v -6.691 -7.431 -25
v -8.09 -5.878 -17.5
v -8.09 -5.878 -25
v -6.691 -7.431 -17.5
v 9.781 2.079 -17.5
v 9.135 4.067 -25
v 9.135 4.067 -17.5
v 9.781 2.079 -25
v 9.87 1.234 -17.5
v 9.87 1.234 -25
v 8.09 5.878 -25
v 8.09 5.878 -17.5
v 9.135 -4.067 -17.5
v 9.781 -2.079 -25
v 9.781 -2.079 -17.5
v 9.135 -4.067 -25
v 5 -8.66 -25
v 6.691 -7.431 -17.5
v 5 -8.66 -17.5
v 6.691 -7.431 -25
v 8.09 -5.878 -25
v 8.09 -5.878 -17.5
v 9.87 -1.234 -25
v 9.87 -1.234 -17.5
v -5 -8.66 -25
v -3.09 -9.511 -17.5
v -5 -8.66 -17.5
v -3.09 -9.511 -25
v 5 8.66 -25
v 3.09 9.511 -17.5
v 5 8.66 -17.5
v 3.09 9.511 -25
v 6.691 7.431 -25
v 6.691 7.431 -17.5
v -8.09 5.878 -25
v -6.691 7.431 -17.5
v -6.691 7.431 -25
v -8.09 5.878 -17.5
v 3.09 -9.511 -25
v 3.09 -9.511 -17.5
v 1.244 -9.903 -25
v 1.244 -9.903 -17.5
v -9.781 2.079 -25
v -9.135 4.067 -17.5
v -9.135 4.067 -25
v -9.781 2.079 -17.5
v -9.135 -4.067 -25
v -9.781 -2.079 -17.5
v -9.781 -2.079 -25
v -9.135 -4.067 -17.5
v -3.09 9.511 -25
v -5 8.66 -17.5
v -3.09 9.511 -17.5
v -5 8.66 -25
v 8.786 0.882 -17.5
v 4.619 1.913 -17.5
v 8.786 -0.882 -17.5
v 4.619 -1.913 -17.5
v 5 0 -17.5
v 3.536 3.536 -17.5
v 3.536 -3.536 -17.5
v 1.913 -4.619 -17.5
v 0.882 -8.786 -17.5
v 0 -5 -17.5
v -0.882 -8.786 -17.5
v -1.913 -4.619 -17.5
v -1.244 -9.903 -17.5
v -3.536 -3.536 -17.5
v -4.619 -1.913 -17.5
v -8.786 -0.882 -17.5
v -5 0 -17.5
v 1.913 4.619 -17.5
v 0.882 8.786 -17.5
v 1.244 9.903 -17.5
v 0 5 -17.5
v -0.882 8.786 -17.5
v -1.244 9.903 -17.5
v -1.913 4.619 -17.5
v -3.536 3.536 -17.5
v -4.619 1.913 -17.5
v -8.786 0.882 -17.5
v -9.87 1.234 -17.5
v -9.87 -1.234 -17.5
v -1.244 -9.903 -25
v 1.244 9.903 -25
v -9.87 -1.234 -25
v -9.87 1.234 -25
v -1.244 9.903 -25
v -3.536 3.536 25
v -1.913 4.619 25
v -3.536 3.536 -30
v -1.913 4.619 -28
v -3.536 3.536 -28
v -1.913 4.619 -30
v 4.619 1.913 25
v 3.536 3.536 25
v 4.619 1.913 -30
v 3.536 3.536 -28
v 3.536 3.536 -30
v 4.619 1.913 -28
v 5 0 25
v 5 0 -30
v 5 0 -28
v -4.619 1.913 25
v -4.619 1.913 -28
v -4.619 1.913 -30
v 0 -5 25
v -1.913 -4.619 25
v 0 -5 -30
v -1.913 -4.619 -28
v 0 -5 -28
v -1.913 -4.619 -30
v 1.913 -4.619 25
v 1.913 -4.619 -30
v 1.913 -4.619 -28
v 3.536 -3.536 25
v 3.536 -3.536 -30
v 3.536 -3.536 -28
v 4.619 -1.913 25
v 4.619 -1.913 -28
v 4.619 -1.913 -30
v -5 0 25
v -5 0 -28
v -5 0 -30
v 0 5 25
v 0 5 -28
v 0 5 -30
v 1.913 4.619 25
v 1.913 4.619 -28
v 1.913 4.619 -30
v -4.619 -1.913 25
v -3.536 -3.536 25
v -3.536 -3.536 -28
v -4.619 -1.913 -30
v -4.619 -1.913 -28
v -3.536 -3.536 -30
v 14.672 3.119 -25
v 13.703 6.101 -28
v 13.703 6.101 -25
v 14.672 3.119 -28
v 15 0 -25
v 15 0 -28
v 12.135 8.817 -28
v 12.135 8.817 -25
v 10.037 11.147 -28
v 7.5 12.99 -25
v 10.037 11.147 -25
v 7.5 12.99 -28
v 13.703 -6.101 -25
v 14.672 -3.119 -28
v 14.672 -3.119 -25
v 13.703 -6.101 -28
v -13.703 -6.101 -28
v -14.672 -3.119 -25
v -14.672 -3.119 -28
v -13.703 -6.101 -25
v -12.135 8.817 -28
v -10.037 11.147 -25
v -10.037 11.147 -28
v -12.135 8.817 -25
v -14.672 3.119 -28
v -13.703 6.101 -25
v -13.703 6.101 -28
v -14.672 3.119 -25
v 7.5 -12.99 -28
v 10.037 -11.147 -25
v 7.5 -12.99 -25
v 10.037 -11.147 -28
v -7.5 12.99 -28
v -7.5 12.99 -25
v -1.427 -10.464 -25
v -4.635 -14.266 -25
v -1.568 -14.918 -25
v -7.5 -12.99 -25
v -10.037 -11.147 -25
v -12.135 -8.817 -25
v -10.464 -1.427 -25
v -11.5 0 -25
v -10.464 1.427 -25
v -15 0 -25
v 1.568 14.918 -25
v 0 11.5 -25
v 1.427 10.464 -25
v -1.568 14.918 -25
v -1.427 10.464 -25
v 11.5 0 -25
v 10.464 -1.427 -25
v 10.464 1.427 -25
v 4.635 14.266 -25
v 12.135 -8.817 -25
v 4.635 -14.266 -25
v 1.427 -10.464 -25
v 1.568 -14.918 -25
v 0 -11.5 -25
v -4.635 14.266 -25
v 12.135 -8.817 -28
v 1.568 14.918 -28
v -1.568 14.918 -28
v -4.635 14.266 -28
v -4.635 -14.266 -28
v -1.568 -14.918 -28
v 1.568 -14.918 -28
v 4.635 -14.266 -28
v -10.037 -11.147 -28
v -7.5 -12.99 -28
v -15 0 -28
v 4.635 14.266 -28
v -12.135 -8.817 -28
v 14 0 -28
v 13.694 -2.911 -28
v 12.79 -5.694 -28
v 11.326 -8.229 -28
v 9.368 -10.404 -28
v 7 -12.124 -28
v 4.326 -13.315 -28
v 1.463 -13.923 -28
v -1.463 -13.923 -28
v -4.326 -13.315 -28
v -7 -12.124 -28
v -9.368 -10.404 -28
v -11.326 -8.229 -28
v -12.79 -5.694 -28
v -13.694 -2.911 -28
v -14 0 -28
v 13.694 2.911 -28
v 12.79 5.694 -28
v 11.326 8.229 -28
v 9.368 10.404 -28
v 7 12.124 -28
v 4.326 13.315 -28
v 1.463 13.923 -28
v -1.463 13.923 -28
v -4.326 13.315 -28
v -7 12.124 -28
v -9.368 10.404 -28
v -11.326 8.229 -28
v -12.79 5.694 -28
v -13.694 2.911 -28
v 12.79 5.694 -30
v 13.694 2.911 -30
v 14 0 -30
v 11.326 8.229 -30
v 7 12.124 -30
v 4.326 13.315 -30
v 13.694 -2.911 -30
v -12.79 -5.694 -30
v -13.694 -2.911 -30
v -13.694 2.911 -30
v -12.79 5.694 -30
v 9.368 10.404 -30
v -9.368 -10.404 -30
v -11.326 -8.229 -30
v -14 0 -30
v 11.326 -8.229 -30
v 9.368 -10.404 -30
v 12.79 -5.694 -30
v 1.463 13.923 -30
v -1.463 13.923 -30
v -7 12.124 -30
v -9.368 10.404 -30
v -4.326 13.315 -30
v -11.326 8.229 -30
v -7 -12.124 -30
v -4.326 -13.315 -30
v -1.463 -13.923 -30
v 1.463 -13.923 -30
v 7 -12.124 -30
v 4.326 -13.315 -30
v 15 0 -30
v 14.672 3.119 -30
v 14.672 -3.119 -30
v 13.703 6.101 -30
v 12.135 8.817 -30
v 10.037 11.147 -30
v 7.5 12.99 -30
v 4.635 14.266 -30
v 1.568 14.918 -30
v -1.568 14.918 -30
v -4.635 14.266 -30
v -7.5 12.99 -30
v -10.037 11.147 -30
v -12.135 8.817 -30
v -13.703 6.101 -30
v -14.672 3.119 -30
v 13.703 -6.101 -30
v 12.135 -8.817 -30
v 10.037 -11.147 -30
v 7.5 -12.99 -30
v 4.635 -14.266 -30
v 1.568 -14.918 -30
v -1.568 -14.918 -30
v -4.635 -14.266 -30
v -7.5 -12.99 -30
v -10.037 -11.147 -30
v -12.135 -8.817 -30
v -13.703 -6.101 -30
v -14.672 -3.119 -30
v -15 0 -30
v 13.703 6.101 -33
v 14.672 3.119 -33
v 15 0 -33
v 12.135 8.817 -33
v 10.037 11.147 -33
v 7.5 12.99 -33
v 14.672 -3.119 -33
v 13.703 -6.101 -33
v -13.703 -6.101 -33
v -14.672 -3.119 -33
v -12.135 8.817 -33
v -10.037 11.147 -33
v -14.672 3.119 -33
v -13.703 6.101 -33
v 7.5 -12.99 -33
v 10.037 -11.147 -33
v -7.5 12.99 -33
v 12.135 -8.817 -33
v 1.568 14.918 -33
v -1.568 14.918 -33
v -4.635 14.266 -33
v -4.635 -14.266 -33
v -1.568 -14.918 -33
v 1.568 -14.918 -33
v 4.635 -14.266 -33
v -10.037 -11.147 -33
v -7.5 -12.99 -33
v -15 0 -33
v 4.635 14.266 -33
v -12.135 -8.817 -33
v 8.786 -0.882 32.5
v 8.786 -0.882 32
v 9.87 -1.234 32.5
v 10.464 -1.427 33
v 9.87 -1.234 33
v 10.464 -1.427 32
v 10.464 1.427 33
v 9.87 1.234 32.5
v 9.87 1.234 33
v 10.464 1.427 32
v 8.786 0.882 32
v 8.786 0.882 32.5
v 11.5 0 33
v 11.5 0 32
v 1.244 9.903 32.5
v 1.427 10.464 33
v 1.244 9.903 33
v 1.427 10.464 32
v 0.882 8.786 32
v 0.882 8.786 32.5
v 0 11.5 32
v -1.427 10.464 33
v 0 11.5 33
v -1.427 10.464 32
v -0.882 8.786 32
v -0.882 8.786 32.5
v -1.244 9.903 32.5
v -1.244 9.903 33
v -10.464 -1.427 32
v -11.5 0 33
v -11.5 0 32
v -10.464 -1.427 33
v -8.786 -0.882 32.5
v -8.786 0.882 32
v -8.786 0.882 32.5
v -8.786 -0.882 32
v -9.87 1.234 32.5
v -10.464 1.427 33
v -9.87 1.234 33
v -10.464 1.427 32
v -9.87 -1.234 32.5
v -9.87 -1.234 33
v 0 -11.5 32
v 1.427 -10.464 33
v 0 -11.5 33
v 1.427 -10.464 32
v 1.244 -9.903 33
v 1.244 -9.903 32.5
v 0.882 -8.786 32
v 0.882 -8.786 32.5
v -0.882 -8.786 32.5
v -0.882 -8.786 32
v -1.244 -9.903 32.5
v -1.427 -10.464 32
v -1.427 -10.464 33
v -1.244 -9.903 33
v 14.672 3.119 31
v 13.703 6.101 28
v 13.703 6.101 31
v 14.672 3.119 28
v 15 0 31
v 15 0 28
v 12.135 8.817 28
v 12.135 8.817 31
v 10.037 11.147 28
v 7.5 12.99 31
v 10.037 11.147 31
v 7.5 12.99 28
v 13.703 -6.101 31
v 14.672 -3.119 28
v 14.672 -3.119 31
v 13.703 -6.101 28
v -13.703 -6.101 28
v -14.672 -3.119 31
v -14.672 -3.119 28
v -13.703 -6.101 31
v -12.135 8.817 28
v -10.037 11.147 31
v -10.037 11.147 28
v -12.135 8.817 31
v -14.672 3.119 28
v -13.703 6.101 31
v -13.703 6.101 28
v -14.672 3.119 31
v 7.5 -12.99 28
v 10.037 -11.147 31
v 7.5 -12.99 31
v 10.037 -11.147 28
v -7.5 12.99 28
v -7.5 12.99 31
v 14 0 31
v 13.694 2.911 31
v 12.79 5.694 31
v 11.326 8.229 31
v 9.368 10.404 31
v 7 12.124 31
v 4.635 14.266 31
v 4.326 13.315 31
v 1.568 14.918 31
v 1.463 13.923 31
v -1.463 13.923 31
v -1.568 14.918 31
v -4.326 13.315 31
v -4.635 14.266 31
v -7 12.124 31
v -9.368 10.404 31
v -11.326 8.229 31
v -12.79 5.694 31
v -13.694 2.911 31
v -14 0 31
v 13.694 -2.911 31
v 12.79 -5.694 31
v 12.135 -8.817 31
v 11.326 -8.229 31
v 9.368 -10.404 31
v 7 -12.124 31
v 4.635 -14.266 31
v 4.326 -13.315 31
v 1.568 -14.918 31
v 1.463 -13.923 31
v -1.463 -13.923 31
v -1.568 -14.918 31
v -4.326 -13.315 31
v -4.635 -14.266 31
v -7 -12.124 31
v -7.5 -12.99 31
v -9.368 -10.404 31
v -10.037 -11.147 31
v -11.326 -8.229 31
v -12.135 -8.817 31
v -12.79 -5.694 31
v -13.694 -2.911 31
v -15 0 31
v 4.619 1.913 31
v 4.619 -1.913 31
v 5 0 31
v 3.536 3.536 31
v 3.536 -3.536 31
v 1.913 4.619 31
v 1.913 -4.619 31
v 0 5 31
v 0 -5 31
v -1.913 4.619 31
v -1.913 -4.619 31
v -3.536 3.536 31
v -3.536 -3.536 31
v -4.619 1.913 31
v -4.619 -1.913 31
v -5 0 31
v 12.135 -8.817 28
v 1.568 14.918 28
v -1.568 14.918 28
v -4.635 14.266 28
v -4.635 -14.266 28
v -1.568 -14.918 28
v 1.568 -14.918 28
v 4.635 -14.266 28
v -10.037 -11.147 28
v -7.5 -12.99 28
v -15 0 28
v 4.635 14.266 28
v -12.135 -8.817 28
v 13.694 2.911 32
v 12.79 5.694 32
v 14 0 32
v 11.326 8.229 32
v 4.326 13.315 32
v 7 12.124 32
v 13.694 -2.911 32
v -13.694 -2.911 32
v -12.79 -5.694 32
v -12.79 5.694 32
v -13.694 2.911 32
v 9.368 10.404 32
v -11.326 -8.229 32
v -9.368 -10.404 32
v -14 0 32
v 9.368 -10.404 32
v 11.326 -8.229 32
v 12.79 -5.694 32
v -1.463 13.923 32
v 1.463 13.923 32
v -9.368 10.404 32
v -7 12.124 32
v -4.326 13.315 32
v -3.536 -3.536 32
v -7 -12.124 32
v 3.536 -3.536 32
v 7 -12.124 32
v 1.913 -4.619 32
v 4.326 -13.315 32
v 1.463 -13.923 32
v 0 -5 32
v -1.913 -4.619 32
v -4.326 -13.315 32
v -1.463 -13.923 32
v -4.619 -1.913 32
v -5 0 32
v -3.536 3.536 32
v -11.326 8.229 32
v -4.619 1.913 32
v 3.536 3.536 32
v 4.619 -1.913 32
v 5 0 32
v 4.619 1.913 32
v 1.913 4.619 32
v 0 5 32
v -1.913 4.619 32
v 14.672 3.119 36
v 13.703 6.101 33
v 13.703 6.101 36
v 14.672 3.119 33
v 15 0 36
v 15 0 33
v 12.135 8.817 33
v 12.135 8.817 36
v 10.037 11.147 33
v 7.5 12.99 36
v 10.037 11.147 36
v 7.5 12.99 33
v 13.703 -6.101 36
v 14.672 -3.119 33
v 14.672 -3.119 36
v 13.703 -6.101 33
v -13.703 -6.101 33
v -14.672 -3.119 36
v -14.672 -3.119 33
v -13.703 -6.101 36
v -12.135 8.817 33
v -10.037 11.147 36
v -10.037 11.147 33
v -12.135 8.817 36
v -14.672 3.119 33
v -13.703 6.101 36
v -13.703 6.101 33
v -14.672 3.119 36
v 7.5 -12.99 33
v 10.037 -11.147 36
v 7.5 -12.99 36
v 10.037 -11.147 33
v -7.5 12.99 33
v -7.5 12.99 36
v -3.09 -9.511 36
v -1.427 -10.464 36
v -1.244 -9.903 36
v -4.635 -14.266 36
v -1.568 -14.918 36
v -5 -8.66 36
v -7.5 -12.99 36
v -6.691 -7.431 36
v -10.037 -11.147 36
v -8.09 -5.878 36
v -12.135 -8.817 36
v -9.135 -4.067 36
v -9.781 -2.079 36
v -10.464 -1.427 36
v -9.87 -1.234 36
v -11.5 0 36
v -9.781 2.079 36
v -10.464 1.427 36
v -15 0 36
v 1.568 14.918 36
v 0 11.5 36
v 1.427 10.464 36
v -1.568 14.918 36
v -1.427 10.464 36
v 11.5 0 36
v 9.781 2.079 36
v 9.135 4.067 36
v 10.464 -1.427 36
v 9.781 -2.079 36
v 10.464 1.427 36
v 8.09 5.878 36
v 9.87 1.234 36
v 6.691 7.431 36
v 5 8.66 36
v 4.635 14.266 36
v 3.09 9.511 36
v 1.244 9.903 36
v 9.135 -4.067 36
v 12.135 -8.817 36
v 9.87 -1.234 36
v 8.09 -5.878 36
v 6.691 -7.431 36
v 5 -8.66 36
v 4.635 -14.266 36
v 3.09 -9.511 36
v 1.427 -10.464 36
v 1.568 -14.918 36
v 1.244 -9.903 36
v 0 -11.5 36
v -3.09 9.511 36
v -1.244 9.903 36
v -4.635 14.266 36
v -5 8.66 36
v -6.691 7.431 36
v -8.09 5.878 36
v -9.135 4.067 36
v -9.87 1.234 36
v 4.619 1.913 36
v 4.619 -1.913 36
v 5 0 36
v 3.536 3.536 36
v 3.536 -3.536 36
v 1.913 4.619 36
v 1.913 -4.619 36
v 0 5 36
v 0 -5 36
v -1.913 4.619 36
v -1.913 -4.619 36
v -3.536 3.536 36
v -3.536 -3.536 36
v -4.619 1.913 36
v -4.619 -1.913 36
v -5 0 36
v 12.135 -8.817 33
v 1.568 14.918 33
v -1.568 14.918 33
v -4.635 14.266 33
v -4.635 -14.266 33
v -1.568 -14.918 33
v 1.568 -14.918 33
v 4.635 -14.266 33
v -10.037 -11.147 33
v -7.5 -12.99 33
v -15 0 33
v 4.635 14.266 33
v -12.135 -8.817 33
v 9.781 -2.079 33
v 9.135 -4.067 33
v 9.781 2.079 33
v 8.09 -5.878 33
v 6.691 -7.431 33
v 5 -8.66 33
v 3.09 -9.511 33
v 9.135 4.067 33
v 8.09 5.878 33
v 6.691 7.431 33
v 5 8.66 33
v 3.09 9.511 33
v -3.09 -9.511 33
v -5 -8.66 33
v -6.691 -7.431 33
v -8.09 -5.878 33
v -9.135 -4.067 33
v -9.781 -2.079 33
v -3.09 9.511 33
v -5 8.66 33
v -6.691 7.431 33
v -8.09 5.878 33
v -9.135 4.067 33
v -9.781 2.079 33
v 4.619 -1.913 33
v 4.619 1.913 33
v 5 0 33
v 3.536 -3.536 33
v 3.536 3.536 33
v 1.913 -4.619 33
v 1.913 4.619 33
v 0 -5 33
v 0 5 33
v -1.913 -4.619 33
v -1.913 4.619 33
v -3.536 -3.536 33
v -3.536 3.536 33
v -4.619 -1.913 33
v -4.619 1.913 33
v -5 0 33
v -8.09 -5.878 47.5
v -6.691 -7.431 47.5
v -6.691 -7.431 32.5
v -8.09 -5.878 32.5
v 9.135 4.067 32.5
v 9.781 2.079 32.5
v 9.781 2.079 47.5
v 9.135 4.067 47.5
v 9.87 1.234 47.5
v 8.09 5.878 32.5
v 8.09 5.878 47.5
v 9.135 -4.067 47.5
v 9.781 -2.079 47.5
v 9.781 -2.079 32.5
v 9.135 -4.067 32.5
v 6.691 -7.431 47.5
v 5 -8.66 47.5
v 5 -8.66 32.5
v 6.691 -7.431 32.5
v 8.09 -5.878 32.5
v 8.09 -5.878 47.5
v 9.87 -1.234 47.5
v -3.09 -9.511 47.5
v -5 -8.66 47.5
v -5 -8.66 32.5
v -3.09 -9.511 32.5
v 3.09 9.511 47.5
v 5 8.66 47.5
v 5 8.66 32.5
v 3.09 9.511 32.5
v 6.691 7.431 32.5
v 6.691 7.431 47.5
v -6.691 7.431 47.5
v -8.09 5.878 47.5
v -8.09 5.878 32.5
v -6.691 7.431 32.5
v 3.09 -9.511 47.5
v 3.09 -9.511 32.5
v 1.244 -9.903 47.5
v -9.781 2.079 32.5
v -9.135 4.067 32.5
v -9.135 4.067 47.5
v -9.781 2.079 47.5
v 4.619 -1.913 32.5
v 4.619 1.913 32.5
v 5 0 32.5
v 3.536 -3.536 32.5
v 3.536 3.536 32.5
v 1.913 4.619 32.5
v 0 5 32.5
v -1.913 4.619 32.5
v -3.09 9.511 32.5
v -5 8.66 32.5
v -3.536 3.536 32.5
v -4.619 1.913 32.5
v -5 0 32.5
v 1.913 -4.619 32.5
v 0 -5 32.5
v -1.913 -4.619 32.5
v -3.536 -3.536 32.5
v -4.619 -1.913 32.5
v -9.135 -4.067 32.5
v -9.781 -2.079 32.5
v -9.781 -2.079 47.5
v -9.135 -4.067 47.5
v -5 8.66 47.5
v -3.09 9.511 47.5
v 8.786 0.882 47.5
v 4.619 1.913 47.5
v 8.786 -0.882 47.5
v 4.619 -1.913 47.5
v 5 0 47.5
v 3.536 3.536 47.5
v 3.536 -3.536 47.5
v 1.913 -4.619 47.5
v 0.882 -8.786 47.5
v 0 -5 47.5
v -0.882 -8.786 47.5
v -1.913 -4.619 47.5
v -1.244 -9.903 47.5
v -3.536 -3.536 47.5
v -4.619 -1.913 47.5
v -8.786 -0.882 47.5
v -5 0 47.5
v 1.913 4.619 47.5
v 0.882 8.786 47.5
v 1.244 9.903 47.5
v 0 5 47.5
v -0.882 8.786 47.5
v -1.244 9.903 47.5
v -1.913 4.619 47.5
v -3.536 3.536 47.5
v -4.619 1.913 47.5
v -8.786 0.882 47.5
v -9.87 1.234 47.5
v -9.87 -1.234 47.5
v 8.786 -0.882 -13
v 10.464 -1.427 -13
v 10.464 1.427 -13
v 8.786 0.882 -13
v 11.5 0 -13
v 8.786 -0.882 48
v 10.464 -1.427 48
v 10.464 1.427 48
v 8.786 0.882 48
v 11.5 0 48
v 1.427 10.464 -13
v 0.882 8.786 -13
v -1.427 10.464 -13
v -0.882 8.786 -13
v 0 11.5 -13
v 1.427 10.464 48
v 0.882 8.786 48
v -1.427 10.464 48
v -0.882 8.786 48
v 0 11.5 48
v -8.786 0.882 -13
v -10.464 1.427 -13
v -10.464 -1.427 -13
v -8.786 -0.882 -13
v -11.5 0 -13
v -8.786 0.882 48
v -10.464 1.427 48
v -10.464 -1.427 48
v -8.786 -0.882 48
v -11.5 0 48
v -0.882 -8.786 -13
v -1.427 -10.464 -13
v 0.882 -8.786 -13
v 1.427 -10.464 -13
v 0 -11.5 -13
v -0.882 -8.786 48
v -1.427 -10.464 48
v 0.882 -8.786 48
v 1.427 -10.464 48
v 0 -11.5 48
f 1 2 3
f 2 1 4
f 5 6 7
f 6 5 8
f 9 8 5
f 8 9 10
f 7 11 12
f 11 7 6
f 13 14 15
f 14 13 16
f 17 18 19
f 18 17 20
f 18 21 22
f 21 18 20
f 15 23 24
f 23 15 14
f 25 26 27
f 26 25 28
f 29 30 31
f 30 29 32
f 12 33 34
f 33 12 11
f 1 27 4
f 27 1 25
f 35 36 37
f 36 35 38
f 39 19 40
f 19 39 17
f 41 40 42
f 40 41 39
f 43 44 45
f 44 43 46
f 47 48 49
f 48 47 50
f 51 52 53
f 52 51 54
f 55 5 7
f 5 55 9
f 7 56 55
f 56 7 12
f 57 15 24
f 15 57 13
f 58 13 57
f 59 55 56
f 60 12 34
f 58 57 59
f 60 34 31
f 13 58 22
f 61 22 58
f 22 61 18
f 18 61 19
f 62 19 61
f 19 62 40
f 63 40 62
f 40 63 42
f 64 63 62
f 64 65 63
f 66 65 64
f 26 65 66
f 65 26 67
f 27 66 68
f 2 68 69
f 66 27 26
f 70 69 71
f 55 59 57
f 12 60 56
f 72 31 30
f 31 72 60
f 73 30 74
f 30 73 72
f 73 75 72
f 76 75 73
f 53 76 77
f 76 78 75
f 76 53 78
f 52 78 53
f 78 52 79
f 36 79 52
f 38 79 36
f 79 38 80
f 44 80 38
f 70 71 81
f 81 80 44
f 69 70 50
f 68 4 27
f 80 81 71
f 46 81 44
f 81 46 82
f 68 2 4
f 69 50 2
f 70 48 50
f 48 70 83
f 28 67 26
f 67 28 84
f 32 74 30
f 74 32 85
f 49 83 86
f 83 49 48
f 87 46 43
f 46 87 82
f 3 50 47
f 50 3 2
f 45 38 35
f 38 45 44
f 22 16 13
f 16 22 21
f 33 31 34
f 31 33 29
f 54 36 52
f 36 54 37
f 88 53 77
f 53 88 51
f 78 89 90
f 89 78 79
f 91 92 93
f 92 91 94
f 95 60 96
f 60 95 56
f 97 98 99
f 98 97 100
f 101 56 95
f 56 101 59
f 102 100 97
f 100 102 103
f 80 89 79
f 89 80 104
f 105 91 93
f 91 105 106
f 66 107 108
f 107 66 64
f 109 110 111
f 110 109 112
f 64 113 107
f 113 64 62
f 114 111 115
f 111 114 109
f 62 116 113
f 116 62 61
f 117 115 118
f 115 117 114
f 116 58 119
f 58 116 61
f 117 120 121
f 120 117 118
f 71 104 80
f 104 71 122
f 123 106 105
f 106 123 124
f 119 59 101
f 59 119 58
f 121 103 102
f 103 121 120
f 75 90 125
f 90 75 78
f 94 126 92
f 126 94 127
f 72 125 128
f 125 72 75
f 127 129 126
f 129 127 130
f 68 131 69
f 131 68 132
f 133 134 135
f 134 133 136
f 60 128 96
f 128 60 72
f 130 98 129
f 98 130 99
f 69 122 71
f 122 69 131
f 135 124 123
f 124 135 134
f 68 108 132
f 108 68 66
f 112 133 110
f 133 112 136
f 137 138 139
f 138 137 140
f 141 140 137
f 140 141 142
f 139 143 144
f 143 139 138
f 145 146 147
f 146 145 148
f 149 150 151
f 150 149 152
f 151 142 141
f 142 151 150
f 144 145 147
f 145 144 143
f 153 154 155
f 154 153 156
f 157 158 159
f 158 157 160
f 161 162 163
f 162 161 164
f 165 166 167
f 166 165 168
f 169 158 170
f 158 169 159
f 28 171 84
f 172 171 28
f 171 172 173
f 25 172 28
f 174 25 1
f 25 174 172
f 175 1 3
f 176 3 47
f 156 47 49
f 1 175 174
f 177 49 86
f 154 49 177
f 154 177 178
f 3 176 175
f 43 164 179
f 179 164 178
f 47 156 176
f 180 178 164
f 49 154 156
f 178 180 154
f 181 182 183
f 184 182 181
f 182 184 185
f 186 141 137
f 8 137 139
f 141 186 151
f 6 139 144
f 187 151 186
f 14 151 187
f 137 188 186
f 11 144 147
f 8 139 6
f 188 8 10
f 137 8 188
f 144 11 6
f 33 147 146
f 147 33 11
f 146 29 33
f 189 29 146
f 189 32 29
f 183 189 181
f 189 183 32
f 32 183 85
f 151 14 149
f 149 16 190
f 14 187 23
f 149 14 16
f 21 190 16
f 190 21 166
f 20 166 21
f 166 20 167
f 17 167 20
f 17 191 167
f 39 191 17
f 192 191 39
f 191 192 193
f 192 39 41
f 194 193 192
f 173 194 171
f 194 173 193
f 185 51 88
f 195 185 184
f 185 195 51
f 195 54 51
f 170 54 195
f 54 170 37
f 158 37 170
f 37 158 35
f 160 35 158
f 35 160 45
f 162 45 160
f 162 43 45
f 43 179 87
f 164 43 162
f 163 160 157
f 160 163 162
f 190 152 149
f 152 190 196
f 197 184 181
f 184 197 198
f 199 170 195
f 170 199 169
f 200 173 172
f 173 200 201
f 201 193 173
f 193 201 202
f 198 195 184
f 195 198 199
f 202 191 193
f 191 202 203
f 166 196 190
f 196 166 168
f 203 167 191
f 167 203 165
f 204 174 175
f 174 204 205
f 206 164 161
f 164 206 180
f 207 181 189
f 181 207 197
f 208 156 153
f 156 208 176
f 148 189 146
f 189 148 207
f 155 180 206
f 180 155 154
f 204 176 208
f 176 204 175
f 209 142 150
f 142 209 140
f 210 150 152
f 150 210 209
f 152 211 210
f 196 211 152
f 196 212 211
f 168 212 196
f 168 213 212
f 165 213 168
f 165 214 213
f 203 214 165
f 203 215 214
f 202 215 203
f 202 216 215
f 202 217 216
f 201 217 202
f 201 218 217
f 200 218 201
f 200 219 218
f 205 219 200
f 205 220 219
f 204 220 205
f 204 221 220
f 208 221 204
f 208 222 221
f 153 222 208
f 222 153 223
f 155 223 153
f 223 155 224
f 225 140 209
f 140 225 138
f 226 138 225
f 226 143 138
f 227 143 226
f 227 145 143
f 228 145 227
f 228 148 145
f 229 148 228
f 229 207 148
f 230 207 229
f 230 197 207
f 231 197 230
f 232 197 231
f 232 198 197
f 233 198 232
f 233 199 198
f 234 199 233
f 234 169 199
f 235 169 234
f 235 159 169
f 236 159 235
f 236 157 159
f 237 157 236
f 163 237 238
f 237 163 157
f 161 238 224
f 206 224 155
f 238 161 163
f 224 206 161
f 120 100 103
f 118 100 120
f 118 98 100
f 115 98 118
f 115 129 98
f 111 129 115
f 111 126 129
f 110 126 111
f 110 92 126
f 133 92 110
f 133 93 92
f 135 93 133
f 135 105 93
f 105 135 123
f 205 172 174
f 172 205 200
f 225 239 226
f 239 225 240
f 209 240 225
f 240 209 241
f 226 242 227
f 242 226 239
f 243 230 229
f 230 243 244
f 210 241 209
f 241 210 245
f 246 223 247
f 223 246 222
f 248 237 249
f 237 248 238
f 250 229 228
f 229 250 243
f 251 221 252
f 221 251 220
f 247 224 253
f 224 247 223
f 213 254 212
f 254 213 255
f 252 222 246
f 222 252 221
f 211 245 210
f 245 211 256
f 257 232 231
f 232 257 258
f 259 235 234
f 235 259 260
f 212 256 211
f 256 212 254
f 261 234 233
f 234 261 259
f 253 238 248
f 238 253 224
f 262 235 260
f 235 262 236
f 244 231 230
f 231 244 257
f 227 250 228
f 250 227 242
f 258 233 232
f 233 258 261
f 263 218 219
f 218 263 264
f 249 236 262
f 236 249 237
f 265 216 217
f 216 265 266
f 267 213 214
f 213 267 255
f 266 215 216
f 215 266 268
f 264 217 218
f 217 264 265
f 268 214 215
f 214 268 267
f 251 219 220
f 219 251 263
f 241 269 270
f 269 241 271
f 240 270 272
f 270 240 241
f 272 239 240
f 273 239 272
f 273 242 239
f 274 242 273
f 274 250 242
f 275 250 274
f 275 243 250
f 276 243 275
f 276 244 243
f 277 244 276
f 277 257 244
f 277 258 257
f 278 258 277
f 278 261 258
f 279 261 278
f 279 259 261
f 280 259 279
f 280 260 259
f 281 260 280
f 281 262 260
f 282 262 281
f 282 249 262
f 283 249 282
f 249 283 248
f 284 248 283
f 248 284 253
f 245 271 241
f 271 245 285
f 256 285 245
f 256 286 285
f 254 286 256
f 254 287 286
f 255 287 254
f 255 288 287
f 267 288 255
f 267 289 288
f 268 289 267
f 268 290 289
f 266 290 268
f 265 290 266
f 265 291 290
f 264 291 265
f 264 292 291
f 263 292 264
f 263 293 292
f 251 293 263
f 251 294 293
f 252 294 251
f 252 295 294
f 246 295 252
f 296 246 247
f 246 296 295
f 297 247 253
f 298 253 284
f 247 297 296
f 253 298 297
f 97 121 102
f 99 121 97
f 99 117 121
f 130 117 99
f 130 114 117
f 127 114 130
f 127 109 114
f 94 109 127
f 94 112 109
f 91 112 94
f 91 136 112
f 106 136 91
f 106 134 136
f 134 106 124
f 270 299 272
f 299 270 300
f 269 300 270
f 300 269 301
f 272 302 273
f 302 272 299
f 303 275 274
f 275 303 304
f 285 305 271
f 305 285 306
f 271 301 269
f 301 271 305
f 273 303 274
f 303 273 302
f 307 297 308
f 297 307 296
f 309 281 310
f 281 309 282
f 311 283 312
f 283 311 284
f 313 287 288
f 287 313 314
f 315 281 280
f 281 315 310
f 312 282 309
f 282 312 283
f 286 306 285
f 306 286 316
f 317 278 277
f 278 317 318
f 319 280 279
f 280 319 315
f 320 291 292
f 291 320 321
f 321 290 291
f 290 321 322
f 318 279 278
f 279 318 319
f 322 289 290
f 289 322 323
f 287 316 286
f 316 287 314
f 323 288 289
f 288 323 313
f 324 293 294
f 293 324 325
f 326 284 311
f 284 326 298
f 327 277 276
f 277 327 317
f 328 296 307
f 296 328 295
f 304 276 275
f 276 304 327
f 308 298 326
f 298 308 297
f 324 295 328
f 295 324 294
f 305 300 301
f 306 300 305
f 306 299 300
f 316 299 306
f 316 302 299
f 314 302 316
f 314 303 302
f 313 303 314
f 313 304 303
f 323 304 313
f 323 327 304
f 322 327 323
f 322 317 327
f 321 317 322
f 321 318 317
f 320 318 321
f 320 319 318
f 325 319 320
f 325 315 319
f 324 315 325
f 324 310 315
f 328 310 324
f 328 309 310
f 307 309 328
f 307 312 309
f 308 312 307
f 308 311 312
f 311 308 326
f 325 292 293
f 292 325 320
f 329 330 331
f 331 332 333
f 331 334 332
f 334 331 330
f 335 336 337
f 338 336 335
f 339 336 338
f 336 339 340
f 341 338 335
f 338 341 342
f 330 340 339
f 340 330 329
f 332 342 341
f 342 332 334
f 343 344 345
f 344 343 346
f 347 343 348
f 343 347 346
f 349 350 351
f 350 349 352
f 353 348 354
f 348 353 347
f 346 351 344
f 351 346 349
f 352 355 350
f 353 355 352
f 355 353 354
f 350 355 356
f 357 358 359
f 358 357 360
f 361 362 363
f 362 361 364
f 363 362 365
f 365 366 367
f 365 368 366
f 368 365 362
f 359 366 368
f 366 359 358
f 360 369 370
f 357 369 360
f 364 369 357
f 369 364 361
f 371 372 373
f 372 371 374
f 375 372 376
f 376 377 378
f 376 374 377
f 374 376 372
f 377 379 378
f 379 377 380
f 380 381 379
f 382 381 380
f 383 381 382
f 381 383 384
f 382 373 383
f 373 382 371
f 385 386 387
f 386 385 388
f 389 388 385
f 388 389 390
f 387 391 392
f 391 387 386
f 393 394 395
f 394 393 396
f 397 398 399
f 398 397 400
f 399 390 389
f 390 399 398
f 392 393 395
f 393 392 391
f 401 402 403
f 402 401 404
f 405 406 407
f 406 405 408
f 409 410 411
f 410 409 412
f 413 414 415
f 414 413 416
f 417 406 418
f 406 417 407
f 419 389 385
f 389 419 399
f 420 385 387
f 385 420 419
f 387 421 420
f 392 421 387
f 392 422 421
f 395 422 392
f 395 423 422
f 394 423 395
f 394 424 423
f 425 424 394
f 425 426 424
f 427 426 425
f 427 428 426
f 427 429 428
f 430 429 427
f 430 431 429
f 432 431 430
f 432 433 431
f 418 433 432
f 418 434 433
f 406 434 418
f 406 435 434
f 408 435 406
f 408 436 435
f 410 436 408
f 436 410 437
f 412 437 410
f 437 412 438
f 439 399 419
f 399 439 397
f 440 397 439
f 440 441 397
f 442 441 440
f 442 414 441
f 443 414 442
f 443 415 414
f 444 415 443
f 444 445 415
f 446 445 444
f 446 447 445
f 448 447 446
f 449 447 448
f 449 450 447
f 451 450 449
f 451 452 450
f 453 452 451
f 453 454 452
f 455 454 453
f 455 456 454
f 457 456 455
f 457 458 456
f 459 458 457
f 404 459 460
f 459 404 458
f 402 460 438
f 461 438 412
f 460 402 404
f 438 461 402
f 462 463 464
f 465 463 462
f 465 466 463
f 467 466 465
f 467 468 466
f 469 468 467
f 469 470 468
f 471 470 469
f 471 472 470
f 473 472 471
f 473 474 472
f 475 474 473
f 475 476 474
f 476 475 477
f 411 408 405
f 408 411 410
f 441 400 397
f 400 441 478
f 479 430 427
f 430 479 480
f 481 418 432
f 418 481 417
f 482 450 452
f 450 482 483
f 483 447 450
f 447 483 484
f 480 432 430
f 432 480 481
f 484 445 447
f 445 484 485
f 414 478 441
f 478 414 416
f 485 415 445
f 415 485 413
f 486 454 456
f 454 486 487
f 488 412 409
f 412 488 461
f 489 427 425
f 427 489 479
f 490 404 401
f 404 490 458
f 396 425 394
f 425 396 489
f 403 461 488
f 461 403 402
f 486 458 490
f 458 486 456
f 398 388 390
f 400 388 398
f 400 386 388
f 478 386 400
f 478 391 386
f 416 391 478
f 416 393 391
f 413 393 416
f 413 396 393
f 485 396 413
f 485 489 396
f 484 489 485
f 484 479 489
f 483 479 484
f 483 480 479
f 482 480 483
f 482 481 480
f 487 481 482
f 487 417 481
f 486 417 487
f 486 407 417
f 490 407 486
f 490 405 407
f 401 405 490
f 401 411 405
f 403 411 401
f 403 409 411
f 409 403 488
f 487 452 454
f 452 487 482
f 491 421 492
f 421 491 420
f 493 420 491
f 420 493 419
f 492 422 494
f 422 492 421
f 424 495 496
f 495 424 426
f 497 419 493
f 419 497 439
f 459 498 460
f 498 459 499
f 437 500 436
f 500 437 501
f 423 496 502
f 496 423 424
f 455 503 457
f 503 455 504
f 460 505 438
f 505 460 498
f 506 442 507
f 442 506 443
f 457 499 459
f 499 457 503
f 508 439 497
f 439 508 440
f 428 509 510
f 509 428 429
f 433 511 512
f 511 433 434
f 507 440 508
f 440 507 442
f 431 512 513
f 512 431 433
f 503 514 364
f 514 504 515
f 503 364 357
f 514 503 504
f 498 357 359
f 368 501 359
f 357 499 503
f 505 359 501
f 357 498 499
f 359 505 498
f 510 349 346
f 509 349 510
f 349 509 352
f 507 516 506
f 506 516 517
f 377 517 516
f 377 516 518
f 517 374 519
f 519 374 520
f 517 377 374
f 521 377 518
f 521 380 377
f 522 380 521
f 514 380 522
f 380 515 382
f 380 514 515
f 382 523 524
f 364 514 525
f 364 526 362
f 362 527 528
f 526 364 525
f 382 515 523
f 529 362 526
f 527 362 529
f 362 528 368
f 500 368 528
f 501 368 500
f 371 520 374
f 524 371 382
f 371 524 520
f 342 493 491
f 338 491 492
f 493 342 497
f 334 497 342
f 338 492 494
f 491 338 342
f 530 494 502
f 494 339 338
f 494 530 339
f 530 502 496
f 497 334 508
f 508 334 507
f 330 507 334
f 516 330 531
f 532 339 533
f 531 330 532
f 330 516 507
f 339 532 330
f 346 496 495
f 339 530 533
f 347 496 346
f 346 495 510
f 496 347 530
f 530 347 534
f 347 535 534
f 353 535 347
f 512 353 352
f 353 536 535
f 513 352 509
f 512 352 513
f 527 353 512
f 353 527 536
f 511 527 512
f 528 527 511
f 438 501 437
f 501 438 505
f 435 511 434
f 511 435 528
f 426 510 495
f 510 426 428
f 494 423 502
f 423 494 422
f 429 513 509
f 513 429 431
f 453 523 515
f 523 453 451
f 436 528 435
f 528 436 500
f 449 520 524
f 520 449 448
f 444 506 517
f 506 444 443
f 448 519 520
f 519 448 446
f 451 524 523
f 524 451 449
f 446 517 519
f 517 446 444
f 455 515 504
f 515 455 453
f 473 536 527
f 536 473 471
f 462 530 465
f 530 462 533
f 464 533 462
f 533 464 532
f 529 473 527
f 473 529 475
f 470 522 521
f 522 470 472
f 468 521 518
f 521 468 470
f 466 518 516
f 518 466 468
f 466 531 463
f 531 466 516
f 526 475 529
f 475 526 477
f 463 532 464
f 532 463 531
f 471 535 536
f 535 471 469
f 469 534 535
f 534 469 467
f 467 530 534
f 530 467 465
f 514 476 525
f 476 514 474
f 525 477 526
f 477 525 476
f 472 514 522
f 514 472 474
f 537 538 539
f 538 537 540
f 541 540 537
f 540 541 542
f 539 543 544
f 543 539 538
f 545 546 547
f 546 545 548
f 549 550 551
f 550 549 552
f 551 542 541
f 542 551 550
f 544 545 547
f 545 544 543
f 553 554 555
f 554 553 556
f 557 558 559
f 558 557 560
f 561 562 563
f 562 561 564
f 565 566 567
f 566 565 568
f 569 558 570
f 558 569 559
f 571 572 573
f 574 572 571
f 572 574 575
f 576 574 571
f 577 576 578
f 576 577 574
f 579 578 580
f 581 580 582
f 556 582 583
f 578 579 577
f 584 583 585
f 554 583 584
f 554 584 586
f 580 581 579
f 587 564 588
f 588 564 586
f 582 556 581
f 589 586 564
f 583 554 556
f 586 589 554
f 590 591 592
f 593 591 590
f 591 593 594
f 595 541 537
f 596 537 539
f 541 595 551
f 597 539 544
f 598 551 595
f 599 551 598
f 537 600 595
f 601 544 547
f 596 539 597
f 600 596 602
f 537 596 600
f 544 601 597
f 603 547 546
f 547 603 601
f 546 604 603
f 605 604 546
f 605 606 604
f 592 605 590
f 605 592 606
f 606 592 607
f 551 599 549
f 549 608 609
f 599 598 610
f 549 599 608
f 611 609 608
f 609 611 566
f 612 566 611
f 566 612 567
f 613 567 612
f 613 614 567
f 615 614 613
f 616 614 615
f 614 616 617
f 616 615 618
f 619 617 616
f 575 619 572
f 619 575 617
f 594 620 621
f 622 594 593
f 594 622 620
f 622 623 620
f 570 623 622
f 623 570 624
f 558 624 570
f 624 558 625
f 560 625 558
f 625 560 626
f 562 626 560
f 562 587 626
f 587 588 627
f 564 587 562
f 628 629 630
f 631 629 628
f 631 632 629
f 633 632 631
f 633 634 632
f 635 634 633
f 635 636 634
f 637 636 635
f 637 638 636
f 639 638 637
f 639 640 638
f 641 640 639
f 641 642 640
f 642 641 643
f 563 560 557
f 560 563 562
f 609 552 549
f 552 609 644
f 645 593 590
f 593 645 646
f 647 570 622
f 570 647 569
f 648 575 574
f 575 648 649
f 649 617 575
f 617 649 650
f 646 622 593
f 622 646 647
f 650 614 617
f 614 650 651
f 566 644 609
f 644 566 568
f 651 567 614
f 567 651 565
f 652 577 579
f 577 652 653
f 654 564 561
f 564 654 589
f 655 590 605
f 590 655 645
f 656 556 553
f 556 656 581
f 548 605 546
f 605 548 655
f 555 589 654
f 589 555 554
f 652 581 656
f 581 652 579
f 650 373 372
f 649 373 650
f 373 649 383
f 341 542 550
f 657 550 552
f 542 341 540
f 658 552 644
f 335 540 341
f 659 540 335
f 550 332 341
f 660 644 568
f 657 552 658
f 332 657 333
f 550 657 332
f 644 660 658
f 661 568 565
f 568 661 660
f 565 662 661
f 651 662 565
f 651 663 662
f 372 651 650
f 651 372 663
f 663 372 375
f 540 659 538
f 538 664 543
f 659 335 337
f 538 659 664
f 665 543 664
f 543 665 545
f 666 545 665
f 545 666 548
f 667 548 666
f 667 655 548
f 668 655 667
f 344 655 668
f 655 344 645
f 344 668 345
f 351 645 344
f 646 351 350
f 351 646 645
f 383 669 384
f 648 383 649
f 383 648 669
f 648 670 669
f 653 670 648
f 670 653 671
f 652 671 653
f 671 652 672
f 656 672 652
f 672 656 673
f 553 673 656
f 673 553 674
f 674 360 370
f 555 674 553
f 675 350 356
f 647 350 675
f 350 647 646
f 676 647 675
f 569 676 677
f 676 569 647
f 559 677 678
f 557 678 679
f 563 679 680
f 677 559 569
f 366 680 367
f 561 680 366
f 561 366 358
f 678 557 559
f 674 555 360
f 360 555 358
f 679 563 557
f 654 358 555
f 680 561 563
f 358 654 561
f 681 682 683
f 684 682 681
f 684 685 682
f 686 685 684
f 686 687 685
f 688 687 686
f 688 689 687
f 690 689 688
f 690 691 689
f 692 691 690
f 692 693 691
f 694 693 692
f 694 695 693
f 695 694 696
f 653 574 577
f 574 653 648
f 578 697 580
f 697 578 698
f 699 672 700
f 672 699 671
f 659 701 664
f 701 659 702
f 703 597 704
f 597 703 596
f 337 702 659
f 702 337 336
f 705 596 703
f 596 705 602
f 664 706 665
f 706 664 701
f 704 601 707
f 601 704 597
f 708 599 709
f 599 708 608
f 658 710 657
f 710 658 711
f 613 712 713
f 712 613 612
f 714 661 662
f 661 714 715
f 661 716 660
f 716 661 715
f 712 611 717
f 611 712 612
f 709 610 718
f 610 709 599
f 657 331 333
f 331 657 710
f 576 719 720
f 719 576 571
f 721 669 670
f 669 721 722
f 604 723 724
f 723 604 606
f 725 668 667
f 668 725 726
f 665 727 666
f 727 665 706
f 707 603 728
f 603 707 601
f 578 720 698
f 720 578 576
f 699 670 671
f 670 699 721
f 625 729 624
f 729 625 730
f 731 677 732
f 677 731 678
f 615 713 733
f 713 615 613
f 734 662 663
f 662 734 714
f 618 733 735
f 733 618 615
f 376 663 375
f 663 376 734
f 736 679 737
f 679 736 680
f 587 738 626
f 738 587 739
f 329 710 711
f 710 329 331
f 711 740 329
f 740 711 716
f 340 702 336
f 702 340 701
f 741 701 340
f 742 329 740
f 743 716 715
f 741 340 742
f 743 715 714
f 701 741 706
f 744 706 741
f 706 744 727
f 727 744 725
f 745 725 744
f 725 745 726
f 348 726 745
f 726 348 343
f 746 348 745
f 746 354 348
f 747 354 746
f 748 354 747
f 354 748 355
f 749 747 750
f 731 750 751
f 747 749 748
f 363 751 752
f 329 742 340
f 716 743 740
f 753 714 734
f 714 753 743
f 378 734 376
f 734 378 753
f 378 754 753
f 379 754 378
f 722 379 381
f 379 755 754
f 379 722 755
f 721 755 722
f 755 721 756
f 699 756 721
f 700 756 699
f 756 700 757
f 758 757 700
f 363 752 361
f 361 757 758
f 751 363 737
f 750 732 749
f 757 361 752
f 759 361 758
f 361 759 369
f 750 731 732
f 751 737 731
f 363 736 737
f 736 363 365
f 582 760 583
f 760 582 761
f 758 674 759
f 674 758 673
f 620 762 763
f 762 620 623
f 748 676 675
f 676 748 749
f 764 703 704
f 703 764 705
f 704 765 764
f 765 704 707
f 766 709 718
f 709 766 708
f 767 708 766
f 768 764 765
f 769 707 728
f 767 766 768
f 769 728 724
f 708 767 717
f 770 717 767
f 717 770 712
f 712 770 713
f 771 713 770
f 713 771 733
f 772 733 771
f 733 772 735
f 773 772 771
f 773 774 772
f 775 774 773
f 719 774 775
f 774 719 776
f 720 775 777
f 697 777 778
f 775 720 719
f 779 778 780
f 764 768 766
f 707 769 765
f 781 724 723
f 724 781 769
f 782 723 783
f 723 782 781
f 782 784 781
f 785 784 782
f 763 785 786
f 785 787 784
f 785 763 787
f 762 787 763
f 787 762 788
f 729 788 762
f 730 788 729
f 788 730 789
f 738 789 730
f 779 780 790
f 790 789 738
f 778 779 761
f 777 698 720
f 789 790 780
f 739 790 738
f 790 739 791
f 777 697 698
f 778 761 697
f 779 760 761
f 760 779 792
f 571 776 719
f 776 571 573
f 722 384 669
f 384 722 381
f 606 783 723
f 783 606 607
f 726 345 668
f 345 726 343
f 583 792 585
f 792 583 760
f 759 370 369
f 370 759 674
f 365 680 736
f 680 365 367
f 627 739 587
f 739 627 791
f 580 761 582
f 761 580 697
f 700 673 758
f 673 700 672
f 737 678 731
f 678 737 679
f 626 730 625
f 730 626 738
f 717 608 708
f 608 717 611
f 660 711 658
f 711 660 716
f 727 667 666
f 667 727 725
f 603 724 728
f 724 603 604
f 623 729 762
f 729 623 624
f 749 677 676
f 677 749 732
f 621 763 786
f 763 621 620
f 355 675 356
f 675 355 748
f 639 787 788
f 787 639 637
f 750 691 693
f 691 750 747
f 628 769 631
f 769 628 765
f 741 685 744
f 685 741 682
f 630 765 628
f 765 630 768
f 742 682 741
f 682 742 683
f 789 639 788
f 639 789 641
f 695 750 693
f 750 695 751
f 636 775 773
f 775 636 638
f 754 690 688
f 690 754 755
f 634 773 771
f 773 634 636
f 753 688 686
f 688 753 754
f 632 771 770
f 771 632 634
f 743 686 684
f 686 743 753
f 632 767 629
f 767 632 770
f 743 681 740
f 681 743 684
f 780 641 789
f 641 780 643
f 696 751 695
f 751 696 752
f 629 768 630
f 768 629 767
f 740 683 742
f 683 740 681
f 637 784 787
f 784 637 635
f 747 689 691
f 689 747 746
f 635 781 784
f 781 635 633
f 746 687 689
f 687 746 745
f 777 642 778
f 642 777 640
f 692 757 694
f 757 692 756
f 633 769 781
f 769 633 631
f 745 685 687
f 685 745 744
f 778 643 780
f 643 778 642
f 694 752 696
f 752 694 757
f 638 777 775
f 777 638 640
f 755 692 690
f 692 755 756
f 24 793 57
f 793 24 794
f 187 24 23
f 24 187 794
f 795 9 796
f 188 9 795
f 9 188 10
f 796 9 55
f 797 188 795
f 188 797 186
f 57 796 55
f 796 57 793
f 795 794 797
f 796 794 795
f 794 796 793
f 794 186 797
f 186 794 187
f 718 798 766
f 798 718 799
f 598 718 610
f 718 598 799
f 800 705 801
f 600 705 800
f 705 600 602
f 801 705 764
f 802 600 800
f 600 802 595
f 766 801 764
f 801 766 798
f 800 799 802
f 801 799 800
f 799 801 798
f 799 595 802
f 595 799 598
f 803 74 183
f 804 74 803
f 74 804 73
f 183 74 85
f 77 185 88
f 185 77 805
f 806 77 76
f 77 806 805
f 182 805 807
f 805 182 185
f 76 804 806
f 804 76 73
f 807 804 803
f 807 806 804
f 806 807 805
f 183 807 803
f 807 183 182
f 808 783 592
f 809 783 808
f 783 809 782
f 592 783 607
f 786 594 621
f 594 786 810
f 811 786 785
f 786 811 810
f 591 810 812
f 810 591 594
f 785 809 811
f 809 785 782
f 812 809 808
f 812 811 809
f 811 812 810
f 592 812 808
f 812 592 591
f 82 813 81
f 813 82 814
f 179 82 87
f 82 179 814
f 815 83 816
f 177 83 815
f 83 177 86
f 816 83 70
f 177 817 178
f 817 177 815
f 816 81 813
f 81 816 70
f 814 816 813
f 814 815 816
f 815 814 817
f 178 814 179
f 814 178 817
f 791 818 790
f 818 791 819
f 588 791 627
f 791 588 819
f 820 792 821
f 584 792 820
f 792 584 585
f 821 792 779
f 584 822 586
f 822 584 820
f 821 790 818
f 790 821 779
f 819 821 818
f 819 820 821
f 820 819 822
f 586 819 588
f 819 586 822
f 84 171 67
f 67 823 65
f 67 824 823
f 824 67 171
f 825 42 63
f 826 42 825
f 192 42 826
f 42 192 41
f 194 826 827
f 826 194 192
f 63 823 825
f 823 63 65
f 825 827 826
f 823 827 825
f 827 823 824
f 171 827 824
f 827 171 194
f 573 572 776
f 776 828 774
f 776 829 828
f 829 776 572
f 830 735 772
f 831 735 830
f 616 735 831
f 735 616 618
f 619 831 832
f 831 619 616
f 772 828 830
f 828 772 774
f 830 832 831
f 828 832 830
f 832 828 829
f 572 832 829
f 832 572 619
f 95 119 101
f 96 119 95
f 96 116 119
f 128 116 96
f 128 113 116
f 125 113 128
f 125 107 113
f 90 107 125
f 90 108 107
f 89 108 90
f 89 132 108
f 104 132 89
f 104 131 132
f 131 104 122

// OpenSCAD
// Parameters
shaft_length = 50;
shaft_diameter = 10;
hub_diameter = 20;
hub_length = 15;
flange_diameter = 30;
flange_thickness = 3;
spacer_diameter = 28;
spacer_thickness = 2;
bolt_diameter = 3;
bolt_length = 20;
nut_diameter = 6;
nut_thickness = 3;
bolt_hole_radius = 10;

// Function to create a hub
module hub() {
    difference() {
        cylinder(h = hub_length, d = hub_diameter);
        translate([0, 0, -1]) cylinder(h = hub_length + 2, d = shaft_diameter);
    }
}

// Function to create a flange plate
module flange_plate() {
    difference() {
        cylinder(h = flange_thickness, d = flange_diameter);
        for (i = [0:90:270]) {
            rotate([0, 0, i])
            translate([bolt_hole_radius, 0, -1])
            cylinder(h = flange_thickness + 2, d = bolt_diameter);
        }
    }
}

// Function to create a spacer ring
module spacer_ring() {
    difference() {
        cylinder(h = spacer_thickness, d = spacer_diameter);
        translate([0, 0, -1]) cylinder(h = spacer_thickness + 2, d = shaft_diameter);
    }
}

// Function to create a bolt
module bolt() {
    cylinder(h = bolt_length, d = bolt_diameter);
}

// Function to create a nut
module nut() {
    cylinder(h = nut_thickness, d = nut_diameter, $fn=6);
}

// Assembly
module coupling() {
    // End hub 1
    translate([0, 0, -shaft_length/2 - hub_length/2]) hub();
    
    // Flange plate 1
    translate([0, 0, -shaft_length/2 - flange_thickness]) flange_plate();
    
    // Spacer ring 1
    translate([0, 0, -shaft_length/2 - flange_thickness - spacer_thickness]) spacer_ring();
    
    // Flange plate 2
    translate([0, 0, -shaft_length/2 - flange_thickness - spacer_thickness - flange_thickness]) flange_plate();
    
    // Central shaft
    translate([0, 0, -shaft_length/2]) cylinder(h = shaft_length, d = shaft_diameter);
    
    // Flange plate 3
    translate([0, 0, shaft_length/2 + flange_thickness]) flange_plate();
    
    // Spacer ring 2
    translate([0, 0, shaft_length/2 + flange_thickness + spacer_thickness]) spacer_ring();
    
    // Flange plate 4
    translate([0, 0, shaft_length/2 + flange_thickness + spacer_thickness + flange_thickness]) flange_plate();
    
    // End hub 2
    translate([0, 0, shaft_length/2 + hub_length/2]) hub();
    
    // Bolts and nuts
    for (i = [0:90:270]) {
        rotate([0, 0, i]) {
            translate([bolt_hole_radius, 0, -shaft_length/2 - flange_thickness - spacer_thickness - flange_thickness])
            bolt();
            
            translate([bolt_hole_radius, 0, -shaft_length/2 - flange_thickness])
            nut();
            
            translate([bolt_hole_radius, 0, shaft_length/2 + flange_thickness])
            bolt();
            
            translate([bolt_hole_radius, 0, shaft_length/2 + flange_thickness + spacer_thickness + flange_thickness])
            nut();
        }
    }
}

// Render the coupling
coupling();
